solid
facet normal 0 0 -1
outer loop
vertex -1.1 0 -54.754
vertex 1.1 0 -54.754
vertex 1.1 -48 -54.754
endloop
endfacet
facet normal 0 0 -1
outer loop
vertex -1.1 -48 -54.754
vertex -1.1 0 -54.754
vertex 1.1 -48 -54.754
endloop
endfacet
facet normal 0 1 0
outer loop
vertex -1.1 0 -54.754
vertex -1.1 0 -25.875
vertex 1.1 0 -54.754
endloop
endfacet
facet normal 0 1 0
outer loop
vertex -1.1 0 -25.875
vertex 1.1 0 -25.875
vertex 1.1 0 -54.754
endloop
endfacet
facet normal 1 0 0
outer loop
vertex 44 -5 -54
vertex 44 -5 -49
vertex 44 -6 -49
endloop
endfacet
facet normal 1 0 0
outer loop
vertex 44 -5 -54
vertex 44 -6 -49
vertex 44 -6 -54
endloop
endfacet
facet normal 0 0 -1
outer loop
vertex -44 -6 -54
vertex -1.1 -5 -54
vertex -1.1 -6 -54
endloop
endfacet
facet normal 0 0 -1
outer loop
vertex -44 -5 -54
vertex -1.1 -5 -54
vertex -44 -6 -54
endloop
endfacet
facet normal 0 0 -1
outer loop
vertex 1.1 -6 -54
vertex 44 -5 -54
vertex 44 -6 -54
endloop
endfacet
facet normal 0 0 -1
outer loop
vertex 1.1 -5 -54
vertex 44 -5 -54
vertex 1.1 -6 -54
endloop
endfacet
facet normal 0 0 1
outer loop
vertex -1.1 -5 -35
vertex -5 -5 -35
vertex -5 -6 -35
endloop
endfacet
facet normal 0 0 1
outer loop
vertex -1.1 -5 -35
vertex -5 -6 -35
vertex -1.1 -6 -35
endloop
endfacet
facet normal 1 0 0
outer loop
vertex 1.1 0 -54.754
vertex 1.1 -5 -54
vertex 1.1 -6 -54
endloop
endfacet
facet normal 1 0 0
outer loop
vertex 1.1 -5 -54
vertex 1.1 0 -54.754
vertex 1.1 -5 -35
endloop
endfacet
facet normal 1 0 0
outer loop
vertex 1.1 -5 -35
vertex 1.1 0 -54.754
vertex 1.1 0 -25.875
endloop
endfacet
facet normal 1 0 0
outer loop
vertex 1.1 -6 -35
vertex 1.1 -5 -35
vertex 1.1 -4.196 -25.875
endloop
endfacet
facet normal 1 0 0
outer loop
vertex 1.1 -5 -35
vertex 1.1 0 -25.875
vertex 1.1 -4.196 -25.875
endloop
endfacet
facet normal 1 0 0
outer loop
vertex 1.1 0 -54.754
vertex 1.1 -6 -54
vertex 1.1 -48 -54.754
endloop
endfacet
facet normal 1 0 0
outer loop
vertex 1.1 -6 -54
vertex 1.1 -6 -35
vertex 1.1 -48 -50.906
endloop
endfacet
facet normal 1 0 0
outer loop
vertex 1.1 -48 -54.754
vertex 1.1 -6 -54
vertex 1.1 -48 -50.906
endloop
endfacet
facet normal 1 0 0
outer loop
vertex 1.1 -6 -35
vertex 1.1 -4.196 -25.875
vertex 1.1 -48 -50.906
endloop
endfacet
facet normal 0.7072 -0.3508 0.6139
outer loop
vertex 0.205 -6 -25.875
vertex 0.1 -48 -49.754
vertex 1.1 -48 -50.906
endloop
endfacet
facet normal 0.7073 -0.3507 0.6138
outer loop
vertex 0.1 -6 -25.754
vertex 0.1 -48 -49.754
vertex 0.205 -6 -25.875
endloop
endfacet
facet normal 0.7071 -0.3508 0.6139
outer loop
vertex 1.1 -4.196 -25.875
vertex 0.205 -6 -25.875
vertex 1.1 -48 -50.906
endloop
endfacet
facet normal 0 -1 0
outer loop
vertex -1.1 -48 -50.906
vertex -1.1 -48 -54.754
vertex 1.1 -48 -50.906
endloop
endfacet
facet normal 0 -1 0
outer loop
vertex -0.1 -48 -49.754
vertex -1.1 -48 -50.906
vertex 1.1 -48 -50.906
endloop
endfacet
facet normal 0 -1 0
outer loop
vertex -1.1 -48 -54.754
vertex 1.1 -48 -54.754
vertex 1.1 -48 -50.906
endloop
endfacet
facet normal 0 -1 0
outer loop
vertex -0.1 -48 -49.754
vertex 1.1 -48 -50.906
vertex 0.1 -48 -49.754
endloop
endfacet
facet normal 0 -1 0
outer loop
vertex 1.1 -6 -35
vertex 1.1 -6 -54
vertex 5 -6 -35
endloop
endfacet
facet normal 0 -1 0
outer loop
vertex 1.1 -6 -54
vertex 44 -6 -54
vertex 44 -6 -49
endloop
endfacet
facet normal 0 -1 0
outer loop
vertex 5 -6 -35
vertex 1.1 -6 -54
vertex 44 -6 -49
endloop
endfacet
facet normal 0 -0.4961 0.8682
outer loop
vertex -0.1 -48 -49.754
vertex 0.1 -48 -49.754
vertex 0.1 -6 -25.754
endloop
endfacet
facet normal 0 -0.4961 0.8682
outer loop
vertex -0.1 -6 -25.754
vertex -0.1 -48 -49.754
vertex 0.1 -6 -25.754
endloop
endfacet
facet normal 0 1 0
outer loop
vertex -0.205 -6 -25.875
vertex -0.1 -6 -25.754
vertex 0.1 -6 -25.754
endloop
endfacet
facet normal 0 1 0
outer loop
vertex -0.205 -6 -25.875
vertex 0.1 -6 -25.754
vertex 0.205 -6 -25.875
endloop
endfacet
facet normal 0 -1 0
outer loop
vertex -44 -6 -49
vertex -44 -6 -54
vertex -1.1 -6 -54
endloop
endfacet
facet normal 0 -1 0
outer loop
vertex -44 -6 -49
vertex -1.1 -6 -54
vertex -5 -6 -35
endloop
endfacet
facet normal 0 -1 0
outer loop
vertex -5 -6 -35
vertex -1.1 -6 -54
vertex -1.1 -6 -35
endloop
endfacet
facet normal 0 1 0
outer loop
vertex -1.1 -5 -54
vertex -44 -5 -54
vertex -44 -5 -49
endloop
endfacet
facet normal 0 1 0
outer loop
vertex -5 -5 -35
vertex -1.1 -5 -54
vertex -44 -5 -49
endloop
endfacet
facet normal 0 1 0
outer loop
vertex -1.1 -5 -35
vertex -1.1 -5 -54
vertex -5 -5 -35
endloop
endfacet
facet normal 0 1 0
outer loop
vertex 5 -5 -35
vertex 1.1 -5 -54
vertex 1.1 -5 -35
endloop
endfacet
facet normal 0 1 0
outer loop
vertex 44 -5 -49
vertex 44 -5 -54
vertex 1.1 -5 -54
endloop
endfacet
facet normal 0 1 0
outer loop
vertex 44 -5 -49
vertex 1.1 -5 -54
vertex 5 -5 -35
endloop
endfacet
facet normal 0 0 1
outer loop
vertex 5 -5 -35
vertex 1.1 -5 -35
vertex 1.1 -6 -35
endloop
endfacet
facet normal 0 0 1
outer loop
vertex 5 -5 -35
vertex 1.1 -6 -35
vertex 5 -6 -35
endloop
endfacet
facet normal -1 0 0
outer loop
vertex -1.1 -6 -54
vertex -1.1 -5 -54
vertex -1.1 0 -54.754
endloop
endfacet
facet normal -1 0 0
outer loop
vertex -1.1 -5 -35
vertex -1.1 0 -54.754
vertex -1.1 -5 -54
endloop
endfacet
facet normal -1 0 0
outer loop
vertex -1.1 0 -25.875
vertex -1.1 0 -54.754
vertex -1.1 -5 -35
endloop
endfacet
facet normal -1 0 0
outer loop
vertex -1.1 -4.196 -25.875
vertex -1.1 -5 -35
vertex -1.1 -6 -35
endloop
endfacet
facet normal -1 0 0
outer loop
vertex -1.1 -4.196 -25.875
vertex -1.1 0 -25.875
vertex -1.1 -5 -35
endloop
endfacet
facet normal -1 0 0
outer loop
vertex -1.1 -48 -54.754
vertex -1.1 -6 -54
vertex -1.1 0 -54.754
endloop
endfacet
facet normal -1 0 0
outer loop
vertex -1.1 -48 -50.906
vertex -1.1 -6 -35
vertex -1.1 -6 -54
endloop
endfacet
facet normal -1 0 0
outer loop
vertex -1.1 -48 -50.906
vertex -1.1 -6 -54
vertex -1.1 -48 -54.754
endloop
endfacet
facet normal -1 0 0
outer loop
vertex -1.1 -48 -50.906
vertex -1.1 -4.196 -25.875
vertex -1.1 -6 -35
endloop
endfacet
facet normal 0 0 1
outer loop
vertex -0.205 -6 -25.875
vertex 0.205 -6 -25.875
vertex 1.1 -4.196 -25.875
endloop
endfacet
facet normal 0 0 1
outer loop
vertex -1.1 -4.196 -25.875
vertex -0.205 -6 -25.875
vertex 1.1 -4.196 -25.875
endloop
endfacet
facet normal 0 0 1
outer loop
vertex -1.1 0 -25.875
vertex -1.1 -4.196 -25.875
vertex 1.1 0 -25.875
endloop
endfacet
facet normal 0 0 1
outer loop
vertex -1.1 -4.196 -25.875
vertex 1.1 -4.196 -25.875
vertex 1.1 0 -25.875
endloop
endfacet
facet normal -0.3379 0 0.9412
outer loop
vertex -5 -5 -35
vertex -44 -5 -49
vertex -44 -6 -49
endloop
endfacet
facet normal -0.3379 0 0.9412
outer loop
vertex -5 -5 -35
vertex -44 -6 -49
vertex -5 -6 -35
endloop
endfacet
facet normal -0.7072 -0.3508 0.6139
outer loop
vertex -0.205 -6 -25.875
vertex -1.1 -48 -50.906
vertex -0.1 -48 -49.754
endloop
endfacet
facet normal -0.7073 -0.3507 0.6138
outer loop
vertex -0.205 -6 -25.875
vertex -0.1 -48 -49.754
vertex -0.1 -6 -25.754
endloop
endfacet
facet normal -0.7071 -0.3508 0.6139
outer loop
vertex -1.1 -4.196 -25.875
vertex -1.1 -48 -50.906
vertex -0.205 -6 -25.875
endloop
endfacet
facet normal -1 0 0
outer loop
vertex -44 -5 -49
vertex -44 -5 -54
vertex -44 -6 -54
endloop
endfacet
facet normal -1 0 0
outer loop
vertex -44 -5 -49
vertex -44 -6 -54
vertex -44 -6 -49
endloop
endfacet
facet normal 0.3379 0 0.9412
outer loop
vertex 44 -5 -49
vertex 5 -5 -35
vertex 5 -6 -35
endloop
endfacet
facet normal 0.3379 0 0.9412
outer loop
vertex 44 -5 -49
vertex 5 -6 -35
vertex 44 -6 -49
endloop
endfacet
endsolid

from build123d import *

# Parameters (mm, degrees)
PAD002_DEPTH    = 1.1
PAD003_DEPTH    = 1
CHAMFER001_SIZE = 1


with BuildPart() as part:
    # Sketch008 → Pad002 (new body, symmetric)
    with BuildSketch(Plane.YZ):
        Polygon((-48, -68.754484), (-6, -44.754484), (-6, -44.875355), (0, -44.875355), (0, -73.754484), (-48, -73.754484), align=None)
    extrude(amount=PAD002_DEPTH, both=True)

    # Sketch009 → Pad003 (join)
    with BuildSketch(Plane(origin=(0, -5, 0), x_dir=(0, 0, -1), z_dir=(0, -1, 0))):
        Polygon((54, 5), (68, 44), (73, 44), (73, -44), (68, -44), (54, -5), align=None)
    extrude(amount=PAD003_DEPTH)

    # Chamfer001
    chamfer001_edges = [part.edges().sort_by_distance(p)[0] for p in [
        (-1.1, -27, -56.754484),
        (1.1, -27, -56.754484),
    ]]
    chamfer(chamfer001_edges, length=CHAMFER001_SIZE)


with BuildPart() as part_1:
    # Body001 placement: moved
    add(part.part.moved(Location((0, 0, 19))))


solid = part_1.part
